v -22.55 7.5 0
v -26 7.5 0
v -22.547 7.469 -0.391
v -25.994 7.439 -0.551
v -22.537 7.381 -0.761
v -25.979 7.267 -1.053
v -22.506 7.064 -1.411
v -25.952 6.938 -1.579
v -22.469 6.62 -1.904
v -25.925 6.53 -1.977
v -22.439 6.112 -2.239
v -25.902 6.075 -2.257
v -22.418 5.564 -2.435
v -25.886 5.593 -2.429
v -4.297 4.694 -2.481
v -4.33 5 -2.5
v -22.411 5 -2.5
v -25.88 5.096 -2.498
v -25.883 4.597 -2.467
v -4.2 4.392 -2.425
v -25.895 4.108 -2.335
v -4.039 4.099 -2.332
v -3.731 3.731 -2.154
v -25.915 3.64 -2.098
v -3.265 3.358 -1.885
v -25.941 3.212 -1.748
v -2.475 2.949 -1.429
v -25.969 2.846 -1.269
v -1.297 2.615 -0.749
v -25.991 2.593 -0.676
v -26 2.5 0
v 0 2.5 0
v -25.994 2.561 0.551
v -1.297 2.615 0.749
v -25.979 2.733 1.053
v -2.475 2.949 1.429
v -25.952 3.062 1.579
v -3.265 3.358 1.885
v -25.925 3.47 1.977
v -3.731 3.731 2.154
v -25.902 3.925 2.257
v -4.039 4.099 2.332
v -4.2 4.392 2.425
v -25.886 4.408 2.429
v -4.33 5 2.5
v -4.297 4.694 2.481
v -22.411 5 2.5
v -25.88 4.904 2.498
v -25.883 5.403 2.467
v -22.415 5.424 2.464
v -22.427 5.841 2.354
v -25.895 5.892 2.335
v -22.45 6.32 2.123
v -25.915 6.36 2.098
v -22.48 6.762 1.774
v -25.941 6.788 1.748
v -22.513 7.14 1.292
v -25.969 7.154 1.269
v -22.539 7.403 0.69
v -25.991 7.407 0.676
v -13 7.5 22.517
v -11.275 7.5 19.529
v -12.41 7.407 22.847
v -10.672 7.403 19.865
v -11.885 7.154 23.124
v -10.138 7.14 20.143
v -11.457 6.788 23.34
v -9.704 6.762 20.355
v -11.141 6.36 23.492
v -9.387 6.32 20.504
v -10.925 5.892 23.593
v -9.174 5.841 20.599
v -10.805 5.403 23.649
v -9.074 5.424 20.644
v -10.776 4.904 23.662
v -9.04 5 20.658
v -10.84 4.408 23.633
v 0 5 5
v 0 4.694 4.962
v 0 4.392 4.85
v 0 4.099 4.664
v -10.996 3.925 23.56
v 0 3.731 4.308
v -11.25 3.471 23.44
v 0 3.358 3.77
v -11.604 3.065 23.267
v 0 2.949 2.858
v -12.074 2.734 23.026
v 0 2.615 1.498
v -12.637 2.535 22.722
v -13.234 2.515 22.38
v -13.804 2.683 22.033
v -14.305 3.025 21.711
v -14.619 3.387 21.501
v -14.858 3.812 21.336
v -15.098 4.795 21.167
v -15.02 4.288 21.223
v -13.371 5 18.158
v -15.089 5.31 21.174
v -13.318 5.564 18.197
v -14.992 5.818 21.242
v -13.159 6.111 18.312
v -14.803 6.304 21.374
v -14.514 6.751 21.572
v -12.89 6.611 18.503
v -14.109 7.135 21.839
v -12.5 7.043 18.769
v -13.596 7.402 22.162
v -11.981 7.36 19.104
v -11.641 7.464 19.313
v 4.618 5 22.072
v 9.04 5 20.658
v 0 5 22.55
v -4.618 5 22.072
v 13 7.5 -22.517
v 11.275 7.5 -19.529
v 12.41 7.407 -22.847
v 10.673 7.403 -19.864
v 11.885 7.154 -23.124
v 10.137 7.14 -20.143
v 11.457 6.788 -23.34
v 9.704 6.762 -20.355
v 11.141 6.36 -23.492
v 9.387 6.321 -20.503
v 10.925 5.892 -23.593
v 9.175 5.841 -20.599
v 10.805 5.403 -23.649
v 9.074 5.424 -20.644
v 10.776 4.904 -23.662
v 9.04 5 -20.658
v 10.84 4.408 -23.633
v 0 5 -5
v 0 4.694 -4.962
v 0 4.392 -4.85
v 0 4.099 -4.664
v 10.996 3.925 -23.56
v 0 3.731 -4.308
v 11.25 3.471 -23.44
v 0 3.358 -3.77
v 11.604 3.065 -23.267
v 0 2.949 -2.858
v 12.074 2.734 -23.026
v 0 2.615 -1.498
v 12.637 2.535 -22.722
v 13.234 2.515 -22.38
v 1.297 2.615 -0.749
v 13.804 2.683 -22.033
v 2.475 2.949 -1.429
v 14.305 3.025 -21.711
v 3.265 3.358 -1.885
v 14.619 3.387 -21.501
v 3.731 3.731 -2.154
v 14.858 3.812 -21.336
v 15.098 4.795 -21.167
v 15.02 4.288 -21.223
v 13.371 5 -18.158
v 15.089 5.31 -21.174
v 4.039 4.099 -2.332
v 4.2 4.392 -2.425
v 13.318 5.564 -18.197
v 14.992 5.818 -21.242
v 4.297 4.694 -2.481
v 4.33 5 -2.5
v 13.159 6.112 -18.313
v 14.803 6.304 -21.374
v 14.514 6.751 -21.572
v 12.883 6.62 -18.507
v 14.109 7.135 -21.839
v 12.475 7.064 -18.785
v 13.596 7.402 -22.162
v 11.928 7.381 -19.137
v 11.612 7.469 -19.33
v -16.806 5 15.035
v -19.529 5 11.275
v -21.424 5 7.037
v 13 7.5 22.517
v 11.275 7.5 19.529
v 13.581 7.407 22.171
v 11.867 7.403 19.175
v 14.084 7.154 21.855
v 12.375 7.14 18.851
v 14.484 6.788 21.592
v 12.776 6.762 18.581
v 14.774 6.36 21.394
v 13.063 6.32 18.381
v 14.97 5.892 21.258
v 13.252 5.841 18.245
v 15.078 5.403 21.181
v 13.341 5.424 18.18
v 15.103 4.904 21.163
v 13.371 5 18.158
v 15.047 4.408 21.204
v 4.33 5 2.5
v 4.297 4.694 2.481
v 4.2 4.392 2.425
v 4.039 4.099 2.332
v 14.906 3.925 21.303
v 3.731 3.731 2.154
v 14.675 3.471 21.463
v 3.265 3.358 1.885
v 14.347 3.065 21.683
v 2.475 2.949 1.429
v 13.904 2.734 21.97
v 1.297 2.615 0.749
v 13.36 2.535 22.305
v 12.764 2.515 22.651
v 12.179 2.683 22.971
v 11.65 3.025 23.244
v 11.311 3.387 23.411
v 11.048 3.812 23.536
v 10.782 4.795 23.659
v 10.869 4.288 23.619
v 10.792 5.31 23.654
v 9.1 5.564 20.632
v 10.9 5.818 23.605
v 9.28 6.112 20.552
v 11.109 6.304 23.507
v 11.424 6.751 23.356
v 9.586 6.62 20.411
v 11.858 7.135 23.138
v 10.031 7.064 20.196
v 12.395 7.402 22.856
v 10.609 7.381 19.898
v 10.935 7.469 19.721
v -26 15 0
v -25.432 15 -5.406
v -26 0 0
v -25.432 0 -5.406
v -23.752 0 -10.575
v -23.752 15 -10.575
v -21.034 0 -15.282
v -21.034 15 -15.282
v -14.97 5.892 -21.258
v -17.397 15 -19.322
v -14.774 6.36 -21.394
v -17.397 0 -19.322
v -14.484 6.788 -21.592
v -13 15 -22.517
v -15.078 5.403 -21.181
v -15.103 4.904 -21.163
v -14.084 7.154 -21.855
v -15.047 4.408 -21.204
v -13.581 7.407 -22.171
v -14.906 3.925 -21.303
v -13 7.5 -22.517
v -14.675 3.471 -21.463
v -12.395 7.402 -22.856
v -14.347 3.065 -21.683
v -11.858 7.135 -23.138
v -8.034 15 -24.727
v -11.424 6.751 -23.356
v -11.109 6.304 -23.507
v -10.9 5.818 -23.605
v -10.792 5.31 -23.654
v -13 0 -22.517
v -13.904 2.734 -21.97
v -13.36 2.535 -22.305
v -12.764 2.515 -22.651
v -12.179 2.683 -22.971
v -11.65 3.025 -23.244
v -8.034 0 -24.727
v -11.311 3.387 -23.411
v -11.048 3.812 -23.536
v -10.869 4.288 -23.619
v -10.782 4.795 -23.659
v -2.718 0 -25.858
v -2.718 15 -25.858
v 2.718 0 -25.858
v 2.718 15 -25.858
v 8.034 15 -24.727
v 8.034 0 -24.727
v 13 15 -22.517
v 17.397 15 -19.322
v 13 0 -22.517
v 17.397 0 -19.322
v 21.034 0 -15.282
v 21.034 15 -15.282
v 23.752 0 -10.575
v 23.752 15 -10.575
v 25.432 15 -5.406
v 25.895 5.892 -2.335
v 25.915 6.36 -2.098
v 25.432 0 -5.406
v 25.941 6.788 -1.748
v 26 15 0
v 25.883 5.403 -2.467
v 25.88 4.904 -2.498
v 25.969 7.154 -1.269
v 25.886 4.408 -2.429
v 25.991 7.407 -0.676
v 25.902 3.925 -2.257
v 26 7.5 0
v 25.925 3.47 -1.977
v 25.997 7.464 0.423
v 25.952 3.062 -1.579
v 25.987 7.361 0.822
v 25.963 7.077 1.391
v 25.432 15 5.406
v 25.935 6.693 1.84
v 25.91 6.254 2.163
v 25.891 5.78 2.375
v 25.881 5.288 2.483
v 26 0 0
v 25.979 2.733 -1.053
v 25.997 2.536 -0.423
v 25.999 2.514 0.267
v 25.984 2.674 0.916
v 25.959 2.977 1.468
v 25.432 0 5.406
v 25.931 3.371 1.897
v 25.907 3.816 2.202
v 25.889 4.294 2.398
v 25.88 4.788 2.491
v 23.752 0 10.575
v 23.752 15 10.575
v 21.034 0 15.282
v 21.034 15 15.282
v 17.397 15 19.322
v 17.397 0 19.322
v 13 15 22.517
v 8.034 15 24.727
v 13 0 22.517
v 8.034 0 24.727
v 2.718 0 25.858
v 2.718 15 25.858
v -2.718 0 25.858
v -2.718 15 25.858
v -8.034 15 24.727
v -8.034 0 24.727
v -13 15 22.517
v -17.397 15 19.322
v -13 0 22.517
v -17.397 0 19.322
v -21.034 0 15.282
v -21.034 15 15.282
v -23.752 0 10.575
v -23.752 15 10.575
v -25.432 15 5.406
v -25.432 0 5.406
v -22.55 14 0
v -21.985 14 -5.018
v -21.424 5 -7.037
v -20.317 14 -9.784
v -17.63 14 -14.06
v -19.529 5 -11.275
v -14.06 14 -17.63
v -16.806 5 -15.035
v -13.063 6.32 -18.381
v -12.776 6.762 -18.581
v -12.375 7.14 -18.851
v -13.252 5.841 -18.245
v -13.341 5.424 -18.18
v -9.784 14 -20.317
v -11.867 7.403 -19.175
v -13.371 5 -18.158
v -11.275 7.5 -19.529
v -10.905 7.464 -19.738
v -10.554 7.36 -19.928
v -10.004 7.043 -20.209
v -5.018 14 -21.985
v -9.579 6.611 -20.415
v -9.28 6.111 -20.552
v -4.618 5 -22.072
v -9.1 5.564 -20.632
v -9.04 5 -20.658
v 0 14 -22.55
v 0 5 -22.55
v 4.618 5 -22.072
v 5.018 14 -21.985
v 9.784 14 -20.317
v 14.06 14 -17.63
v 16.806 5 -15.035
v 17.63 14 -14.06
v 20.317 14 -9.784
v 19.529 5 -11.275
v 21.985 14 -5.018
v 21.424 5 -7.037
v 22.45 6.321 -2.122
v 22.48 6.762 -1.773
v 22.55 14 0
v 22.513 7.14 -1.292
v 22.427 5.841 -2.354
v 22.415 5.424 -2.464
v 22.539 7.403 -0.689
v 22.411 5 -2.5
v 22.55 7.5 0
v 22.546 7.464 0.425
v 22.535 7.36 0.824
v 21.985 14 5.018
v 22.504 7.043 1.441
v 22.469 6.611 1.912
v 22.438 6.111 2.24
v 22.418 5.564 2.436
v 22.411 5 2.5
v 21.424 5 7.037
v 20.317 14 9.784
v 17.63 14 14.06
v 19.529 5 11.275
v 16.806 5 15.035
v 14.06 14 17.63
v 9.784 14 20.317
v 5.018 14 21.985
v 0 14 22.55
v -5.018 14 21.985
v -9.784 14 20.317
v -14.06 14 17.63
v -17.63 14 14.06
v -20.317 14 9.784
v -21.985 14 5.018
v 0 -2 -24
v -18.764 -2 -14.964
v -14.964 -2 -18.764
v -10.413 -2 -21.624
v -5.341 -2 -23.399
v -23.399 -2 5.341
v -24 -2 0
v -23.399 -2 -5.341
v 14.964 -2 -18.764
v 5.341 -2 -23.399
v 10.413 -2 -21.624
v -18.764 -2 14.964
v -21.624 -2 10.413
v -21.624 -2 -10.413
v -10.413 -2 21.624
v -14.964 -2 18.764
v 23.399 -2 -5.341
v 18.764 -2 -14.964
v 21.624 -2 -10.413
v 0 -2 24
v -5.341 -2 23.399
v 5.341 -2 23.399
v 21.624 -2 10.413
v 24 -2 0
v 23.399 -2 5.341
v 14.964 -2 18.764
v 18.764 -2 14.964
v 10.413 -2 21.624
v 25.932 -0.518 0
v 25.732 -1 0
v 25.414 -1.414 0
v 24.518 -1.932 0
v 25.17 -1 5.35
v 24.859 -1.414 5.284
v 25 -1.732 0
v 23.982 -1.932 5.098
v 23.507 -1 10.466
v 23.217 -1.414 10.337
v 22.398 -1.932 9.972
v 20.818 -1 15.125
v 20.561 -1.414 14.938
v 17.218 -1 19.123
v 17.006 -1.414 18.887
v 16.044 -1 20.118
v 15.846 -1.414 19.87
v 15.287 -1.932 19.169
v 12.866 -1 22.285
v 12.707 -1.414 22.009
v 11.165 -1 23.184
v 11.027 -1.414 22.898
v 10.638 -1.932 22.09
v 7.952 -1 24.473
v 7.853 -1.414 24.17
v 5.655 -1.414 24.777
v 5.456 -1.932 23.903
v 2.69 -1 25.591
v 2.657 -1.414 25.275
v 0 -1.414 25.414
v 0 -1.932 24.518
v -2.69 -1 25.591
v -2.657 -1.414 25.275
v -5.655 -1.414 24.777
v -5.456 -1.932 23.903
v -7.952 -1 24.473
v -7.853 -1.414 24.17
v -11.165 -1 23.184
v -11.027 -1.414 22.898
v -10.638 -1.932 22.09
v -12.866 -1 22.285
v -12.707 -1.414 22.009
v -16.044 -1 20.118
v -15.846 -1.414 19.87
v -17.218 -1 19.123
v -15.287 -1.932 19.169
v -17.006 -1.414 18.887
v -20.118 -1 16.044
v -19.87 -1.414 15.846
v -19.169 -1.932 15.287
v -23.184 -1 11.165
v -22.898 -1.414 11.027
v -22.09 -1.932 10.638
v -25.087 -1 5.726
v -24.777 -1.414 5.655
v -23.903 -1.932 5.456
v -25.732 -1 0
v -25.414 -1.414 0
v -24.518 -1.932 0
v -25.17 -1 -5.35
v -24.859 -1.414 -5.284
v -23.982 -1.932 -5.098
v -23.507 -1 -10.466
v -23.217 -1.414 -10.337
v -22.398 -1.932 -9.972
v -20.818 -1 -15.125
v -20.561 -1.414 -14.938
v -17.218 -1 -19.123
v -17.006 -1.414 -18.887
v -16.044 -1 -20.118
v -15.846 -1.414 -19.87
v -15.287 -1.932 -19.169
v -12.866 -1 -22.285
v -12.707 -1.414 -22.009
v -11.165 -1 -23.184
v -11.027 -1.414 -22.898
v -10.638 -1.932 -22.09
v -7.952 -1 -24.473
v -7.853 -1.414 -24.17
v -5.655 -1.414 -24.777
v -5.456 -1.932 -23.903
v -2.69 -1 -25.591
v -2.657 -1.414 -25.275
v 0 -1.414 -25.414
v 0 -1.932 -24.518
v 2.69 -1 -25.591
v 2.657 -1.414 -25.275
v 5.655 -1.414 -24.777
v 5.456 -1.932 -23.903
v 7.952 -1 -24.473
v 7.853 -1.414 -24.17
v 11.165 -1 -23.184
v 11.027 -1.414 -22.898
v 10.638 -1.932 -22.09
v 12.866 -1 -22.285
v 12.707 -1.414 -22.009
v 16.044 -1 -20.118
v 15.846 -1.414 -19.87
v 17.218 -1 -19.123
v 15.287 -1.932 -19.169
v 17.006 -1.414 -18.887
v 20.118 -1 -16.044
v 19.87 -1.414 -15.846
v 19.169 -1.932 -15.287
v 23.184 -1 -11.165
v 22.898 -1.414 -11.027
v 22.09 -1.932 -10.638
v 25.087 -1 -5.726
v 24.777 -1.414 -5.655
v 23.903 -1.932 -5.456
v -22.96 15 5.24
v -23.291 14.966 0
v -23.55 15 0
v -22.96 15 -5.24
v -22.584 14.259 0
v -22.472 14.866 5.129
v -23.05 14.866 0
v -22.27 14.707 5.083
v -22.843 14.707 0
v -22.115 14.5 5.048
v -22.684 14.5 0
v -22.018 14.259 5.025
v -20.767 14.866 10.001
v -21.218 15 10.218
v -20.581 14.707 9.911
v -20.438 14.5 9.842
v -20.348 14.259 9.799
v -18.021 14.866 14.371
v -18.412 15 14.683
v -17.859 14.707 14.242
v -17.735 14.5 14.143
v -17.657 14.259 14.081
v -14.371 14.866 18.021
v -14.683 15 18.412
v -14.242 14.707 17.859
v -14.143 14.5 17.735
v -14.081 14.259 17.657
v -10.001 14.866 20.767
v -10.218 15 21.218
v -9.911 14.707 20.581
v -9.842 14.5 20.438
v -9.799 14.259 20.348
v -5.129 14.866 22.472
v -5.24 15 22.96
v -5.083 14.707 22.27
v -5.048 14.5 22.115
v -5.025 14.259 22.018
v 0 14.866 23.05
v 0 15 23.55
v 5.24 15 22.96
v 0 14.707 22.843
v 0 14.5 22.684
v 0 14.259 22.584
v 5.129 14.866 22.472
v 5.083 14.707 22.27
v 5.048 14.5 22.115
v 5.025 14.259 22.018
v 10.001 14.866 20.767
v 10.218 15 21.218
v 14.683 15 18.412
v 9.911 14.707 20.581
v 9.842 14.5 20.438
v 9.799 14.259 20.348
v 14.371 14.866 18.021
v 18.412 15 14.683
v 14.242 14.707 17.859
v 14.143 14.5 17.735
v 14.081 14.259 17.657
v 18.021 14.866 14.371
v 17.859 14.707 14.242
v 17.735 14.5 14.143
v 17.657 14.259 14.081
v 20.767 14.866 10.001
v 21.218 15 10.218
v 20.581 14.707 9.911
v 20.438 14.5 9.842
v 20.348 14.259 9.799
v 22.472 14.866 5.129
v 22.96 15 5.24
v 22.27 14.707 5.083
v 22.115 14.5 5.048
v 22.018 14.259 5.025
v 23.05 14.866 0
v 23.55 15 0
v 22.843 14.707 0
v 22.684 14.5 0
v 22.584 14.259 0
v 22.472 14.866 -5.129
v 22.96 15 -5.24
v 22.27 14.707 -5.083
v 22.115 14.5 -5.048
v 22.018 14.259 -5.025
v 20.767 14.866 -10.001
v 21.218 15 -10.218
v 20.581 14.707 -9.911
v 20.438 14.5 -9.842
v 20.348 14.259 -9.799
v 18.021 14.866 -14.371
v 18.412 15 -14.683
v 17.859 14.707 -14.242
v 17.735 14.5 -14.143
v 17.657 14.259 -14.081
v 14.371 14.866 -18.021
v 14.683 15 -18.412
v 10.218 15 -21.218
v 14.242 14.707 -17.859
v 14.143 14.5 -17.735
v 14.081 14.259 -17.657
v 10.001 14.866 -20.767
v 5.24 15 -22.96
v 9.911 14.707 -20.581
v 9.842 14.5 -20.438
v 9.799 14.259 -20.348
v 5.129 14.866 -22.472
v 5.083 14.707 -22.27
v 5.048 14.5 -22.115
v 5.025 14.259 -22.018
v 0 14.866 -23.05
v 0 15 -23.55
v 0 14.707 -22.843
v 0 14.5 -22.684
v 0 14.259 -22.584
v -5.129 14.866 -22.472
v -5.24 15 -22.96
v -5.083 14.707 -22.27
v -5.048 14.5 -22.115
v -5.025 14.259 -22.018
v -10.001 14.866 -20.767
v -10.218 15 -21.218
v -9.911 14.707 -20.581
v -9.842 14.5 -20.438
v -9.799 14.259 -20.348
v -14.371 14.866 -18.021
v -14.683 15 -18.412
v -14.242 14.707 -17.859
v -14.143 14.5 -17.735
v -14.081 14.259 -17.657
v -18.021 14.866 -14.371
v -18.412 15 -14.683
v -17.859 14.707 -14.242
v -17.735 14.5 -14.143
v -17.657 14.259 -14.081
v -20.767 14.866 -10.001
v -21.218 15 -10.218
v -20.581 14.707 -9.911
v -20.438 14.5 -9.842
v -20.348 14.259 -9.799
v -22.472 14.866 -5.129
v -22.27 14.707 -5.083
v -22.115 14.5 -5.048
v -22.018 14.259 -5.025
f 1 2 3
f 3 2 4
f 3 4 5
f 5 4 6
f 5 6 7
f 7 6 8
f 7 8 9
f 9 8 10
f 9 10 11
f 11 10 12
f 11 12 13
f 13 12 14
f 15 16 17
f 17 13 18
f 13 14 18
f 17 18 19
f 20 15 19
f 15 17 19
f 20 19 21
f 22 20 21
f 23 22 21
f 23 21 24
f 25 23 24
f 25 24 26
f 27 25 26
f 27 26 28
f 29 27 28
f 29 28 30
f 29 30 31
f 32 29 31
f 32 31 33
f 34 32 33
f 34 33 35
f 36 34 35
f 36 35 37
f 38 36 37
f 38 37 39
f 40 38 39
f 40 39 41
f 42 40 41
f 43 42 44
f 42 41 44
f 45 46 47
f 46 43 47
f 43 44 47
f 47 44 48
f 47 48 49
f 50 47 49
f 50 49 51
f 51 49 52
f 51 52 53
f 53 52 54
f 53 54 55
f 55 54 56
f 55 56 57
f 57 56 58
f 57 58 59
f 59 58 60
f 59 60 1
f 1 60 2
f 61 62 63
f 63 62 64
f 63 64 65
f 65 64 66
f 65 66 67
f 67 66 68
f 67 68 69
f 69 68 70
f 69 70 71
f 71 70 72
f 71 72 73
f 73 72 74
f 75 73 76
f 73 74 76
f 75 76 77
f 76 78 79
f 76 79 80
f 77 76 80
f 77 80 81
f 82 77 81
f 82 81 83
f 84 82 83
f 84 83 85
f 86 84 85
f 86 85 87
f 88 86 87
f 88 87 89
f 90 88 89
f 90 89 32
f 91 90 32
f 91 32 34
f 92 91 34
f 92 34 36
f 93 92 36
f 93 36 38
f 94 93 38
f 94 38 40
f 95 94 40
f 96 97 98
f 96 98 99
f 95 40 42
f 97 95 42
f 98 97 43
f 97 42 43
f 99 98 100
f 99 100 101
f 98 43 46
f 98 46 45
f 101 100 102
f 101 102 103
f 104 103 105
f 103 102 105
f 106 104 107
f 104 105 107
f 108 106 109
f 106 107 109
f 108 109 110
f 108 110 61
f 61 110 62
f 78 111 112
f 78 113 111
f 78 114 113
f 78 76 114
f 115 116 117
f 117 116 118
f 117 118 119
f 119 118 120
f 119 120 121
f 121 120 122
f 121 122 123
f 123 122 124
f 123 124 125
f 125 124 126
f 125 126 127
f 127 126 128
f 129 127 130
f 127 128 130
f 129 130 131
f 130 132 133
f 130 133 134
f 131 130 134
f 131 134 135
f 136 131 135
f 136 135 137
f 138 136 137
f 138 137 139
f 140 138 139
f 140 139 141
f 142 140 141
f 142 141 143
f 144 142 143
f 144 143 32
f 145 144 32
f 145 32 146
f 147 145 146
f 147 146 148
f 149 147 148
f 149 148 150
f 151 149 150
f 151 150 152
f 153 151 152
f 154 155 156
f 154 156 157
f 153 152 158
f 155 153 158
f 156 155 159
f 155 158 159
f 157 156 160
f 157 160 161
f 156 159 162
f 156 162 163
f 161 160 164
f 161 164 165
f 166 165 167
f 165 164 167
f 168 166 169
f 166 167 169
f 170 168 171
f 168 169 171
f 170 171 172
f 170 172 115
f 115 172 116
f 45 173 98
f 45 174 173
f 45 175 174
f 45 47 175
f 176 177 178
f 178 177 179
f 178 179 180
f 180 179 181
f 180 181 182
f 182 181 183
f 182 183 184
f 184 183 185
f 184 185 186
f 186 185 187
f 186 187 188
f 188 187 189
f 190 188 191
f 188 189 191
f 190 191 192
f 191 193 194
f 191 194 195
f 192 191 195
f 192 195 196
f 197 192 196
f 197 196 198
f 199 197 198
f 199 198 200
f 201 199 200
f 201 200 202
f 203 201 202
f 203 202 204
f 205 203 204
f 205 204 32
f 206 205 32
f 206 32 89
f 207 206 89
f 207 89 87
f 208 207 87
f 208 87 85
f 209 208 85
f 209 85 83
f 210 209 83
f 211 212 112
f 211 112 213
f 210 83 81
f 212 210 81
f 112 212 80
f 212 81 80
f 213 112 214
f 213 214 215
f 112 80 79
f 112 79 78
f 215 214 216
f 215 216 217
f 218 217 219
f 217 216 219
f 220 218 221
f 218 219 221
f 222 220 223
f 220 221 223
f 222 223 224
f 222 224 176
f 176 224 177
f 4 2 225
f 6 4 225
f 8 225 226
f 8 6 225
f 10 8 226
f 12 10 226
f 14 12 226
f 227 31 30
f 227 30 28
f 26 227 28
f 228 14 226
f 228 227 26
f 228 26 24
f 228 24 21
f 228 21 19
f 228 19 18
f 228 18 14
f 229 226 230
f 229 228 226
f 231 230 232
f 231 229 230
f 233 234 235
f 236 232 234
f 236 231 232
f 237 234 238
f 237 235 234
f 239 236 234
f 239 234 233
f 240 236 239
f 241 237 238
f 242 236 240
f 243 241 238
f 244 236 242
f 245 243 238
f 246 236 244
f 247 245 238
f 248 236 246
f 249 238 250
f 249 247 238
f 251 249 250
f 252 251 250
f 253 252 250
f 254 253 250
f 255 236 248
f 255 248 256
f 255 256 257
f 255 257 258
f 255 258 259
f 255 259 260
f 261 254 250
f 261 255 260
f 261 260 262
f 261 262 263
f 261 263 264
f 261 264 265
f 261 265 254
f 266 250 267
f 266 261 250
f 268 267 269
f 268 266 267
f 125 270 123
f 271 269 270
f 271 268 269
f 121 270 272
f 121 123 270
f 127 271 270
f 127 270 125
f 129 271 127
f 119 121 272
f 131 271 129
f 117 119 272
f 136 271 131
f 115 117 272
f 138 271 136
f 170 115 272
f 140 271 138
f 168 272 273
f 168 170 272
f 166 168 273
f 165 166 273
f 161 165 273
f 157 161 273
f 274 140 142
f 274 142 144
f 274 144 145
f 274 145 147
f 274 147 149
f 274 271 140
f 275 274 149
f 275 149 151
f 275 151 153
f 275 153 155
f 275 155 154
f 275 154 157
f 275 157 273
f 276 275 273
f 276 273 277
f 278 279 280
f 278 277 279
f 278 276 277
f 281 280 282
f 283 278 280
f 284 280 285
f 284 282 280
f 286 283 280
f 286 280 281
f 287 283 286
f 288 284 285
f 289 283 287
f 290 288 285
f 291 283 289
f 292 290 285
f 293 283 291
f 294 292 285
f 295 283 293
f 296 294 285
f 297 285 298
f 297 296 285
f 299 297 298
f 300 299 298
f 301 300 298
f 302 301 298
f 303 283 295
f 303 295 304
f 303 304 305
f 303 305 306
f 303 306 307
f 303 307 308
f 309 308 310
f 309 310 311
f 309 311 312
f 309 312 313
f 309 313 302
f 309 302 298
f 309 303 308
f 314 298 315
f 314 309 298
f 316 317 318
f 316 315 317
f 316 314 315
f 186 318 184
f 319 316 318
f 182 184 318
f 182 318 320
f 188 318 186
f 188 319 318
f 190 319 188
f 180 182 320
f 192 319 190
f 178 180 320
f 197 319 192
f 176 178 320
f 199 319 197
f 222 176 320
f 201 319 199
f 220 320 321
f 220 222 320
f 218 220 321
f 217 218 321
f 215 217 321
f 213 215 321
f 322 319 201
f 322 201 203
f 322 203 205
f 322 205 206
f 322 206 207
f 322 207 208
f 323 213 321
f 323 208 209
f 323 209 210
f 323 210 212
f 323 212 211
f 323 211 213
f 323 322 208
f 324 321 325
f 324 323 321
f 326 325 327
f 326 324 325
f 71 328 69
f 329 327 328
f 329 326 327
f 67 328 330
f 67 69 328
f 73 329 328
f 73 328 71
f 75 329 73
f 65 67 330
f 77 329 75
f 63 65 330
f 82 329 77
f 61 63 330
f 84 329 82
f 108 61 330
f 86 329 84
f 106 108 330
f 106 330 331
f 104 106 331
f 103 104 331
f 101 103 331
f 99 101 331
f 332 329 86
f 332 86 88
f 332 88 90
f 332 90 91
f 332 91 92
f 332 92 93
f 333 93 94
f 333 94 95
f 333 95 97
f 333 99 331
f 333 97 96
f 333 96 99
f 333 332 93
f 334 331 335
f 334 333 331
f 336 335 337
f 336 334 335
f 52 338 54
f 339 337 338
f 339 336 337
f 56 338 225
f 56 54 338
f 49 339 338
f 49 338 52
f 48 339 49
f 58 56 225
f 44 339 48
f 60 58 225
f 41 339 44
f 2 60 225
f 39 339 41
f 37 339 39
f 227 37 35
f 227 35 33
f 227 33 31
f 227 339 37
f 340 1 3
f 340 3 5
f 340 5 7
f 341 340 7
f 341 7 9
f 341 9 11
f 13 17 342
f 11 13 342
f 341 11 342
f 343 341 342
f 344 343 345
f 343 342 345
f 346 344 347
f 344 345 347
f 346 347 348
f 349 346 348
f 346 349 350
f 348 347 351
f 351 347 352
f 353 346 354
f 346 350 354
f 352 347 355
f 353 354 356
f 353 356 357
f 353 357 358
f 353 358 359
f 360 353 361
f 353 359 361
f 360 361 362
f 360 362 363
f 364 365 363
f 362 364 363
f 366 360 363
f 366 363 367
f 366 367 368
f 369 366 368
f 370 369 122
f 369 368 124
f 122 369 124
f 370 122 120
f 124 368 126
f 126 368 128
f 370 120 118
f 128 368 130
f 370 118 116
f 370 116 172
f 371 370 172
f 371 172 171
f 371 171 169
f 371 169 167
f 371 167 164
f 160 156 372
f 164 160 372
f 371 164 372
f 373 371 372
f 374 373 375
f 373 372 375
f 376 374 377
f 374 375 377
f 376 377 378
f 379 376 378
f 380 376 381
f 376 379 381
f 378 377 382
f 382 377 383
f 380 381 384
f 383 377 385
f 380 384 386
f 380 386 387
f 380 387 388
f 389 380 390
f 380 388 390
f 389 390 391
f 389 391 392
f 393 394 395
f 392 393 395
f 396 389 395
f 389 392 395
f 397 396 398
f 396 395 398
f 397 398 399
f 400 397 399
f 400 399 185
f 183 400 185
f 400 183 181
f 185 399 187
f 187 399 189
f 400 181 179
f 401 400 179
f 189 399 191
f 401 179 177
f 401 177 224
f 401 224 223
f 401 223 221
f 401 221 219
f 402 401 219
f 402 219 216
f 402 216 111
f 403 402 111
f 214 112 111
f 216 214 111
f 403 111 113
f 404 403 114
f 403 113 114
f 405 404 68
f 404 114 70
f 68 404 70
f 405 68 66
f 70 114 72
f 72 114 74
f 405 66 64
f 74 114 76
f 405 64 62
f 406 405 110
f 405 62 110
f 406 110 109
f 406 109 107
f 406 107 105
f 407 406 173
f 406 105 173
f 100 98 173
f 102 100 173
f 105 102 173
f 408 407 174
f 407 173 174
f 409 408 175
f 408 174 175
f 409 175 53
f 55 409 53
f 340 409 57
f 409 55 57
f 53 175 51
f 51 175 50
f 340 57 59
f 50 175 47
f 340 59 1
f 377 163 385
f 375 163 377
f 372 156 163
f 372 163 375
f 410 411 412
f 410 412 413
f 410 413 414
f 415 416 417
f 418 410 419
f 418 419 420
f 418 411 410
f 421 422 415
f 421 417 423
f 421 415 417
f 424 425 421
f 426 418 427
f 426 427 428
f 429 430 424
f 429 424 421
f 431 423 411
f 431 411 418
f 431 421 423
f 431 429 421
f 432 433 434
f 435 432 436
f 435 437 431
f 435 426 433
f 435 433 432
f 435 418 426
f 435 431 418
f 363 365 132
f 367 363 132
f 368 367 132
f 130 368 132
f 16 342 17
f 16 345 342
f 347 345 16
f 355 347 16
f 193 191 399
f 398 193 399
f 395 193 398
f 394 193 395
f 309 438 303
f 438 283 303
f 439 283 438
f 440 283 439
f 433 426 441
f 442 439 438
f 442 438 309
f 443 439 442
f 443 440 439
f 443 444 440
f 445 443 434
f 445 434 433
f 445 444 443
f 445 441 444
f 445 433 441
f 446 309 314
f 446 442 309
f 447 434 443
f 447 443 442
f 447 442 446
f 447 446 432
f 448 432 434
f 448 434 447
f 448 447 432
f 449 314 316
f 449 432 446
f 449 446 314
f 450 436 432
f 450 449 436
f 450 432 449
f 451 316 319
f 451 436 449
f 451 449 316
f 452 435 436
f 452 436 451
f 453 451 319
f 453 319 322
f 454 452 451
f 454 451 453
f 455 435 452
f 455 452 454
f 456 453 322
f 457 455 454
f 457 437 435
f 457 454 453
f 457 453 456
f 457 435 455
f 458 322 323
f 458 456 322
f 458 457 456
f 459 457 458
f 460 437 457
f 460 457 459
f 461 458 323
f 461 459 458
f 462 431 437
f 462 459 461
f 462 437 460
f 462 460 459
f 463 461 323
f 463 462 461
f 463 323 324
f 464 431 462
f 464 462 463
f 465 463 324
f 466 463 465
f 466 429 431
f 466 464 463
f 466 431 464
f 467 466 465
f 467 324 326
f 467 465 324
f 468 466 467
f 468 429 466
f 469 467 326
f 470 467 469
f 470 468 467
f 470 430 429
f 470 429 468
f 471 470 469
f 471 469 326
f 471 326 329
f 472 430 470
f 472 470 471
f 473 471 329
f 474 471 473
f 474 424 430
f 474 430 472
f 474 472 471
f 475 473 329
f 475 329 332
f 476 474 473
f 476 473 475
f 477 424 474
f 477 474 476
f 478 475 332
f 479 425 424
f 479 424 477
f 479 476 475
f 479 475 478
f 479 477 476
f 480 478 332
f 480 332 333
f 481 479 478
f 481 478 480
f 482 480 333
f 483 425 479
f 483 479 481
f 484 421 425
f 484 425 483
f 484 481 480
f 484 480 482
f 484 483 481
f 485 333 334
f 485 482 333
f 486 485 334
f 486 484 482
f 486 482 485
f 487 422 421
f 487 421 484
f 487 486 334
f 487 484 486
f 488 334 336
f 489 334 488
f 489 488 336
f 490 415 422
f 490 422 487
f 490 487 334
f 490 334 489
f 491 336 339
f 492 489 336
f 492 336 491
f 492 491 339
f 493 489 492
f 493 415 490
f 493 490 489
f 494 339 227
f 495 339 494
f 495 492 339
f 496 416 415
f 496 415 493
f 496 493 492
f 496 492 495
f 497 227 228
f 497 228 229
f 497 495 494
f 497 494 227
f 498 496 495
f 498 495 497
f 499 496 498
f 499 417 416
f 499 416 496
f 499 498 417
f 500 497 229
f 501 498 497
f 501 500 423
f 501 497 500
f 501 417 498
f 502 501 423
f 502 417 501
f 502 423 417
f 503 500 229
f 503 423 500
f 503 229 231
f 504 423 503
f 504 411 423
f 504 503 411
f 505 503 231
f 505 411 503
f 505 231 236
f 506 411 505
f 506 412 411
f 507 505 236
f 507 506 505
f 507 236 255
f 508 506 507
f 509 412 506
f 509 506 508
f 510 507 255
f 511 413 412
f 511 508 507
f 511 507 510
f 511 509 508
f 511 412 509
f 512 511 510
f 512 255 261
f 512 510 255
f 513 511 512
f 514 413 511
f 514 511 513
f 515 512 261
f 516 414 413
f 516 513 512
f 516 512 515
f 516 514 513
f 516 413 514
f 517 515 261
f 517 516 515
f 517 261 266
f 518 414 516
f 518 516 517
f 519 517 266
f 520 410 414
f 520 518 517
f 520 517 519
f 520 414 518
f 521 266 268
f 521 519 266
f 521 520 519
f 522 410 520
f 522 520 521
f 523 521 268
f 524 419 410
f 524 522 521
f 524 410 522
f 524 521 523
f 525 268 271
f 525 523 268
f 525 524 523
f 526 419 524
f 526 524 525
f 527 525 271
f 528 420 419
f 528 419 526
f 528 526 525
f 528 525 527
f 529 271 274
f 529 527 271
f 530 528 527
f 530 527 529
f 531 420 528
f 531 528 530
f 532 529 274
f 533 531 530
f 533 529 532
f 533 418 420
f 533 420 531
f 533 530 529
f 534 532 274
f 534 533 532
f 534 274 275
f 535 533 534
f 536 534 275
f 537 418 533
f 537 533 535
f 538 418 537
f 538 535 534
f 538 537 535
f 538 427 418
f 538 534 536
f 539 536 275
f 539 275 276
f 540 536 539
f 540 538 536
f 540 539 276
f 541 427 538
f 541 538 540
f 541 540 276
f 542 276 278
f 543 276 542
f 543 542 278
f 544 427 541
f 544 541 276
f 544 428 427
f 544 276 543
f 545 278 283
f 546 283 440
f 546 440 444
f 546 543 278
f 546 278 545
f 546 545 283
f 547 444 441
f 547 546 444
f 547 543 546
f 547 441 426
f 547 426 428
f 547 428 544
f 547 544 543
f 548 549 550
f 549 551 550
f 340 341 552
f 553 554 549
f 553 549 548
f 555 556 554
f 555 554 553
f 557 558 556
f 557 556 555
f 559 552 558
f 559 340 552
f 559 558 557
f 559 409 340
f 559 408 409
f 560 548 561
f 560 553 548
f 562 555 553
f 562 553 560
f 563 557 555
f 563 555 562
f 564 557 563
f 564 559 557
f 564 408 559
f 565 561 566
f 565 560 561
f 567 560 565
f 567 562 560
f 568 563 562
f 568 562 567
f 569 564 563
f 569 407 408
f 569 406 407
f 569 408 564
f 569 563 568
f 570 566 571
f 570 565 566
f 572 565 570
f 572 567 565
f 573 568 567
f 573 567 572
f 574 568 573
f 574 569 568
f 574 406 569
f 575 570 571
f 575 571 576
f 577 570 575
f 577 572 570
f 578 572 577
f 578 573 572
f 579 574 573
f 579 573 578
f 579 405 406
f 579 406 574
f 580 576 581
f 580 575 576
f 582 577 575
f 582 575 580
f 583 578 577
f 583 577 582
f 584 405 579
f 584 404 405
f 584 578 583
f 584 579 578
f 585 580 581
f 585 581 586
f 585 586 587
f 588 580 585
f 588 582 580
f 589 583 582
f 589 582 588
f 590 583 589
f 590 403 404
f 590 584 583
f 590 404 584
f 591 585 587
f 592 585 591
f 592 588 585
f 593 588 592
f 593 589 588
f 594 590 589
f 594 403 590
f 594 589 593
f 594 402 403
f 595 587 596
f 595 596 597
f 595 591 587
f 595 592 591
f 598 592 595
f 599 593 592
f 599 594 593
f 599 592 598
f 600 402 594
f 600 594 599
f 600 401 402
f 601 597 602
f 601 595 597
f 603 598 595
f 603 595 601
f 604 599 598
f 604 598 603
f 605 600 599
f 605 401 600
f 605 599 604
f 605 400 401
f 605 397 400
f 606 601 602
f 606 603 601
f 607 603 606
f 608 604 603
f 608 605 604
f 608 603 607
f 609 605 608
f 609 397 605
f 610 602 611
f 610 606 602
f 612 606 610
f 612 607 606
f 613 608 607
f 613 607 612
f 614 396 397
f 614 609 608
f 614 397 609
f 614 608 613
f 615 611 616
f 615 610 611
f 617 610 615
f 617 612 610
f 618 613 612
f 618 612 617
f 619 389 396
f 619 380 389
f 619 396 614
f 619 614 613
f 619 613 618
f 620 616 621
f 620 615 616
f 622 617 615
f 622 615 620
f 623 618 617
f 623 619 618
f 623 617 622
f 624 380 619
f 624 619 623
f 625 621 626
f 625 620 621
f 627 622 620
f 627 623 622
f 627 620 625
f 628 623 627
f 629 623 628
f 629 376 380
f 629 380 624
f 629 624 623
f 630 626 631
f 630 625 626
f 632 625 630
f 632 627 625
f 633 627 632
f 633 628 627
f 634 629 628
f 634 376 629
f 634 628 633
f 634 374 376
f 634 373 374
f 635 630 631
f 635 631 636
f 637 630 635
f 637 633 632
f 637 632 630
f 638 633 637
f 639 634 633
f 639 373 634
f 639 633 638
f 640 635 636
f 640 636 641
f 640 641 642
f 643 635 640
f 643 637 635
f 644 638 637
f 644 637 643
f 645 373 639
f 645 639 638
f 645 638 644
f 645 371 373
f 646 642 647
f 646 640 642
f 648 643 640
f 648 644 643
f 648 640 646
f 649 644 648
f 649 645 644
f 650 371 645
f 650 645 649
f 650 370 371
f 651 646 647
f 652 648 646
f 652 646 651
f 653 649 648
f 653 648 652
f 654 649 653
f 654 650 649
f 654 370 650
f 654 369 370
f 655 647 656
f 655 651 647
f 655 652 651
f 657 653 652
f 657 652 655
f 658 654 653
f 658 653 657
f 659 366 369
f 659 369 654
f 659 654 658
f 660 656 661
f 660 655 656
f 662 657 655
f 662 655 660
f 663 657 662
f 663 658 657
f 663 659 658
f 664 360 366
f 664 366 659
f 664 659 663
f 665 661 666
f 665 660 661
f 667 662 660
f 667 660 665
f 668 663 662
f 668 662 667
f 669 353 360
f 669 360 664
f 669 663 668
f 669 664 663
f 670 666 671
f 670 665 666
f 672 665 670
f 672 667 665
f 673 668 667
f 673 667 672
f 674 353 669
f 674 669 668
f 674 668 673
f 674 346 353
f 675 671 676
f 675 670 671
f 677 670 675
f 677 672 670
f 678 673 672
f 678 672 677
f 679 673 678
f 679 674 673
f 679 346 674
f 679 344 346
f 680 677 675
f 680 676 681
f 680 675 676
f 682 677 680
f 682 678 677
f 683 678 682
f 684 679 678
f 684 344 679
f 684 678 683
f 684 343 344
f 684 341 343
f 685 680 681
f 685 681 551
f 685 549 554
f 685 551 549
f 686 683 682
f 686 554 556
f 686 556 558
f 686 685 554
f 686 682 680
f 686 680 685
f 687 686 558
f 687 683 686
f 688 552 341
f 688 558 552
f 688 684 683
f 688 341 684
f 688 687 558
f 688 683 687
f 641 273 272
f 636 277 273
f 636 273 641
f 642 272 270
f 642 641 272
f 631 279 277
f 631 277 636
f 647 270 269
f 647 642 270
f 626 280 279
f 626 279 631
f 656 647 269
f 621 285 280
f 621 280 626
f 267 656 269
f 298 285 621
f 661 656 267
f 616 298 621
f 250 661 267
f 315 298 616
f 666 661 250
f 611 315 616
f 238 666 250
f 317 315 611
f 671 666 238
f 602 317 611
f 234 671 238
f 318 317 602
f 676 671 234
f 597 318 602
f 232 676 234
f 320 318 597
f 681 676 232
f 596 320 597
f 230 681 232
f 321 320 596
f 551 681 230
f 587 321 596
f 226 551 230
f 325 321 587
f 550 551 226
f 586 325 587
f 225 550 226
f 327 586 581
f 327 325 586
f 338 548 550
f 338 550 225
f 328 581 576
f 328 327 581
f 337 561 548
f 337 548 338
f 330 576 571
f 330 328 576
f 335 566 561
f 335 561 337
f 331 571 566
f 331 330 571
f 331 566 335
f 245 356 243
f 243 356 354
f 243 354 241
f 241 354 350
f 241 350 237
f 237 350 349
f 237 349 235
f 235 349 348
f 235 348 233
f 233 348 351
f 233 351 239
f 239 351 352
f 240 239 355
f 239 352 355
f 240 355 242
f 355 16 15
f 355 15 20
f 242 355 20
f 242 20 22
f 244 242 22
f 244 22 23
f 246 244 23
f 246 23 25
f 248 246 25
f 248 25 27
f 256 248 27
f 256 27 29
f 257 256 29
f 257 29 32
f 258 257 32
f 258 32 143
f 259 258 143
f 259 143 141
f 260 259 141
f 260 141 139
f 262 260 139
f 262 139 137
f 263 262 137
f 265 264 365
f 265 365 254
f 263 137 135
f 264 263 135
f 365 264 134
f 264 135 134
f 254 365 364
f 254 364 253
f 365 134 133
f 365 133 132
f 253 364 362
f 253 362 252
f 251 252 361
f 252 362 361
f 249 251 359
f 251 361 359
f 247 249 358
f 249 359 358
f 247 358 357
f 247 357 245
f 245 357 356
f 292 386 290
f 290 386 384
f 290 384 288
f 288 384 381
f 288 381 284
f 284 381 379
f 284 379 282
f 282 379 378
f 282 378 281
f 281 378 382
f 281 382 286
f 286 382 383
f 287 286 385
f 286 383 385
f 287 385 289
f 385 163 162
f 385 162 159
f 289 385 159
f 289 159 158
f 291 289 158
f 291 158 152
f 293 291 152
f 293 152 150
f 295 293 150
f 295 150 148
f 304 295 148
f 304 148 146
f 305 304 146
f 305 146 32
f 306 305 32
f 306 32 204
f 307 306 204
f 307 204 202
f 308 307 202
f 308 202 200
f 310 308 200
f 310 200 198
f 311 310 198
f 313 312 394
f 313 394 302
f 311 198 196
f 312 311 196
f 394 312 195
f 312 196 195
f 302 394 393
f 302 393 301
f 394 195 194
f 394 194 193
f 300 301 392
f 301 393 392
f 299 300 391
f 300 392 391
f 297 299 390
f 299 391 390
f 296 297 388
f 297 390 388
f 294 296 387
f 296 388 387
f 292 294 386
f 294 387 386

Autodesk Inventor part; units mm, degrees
ref_plane "YZ Plane" through (0, 0, 0) normal (1, 0, 0) x (0, 1, 0)
ref_plane "XZ Plane" through (0, 0, 0) normal (0, 1, 0) x (-1, 0, 0)
ref_plane "XY Plane" through (0, 0, 0) normal (0, 0, 1) x (1, 0, 0)
sketch "Sketch1" plane through (0, 0, 0) normal (0, 1, 0) x (-1, 0, 0)
  circle A0 centre (0, 0) radius 22.55
  circle A1 centre (0, 0) radius 26
  dimension "d0" = 45.1
  dimension "d1" = 52
extrude "Extrusion1" add sketch "Sketch1" along normal blind 15
sketch "Sketch2" plane through (0, 0, 0) normal (0, -1, 0) x (1, 0, 0)
  circle A0 centre (0, 0) radius 26
  circle A1 centre (0, 0) radius 26 projected
extrude "Extrusion2" add sketch "Sketch2" along normal blind 2
fillet "Fillet1" radius 1 1 edges at (22.55, 15, 0)
sketch "Sketch3" plane through (0, 0, 0) normal (0, 1, 0) x (1, 0, 0)
  circle A0 centre (0, 0) radius 23
extrude "Extrusion3" add sketch "Sketch3" along normal blind 5
sketch "Sketch4" plane through (0, 0, 0) normal (1, 0, 0) x (0, 1, 0)
  line L0 (5, 22.55) -> (5, -22.55) projected
  circle A0 centre (5, 0) radius 2.5
  line L1 (5, -2.5) -> (5, 2.5)
  dimension "d9" = 5
extrude "Extrusion4" cut sketch "Sketch4" against normal through all
pattern_circular "Circular Pattern1" count 6 over 360 about axis through (0, 0, 0) along (0, 1, 0) of "Extrusion4"
fillet "Fillet2" radius 2 1 edges at (-26, -2, 0)
properties part number "Tapacontenedor"
